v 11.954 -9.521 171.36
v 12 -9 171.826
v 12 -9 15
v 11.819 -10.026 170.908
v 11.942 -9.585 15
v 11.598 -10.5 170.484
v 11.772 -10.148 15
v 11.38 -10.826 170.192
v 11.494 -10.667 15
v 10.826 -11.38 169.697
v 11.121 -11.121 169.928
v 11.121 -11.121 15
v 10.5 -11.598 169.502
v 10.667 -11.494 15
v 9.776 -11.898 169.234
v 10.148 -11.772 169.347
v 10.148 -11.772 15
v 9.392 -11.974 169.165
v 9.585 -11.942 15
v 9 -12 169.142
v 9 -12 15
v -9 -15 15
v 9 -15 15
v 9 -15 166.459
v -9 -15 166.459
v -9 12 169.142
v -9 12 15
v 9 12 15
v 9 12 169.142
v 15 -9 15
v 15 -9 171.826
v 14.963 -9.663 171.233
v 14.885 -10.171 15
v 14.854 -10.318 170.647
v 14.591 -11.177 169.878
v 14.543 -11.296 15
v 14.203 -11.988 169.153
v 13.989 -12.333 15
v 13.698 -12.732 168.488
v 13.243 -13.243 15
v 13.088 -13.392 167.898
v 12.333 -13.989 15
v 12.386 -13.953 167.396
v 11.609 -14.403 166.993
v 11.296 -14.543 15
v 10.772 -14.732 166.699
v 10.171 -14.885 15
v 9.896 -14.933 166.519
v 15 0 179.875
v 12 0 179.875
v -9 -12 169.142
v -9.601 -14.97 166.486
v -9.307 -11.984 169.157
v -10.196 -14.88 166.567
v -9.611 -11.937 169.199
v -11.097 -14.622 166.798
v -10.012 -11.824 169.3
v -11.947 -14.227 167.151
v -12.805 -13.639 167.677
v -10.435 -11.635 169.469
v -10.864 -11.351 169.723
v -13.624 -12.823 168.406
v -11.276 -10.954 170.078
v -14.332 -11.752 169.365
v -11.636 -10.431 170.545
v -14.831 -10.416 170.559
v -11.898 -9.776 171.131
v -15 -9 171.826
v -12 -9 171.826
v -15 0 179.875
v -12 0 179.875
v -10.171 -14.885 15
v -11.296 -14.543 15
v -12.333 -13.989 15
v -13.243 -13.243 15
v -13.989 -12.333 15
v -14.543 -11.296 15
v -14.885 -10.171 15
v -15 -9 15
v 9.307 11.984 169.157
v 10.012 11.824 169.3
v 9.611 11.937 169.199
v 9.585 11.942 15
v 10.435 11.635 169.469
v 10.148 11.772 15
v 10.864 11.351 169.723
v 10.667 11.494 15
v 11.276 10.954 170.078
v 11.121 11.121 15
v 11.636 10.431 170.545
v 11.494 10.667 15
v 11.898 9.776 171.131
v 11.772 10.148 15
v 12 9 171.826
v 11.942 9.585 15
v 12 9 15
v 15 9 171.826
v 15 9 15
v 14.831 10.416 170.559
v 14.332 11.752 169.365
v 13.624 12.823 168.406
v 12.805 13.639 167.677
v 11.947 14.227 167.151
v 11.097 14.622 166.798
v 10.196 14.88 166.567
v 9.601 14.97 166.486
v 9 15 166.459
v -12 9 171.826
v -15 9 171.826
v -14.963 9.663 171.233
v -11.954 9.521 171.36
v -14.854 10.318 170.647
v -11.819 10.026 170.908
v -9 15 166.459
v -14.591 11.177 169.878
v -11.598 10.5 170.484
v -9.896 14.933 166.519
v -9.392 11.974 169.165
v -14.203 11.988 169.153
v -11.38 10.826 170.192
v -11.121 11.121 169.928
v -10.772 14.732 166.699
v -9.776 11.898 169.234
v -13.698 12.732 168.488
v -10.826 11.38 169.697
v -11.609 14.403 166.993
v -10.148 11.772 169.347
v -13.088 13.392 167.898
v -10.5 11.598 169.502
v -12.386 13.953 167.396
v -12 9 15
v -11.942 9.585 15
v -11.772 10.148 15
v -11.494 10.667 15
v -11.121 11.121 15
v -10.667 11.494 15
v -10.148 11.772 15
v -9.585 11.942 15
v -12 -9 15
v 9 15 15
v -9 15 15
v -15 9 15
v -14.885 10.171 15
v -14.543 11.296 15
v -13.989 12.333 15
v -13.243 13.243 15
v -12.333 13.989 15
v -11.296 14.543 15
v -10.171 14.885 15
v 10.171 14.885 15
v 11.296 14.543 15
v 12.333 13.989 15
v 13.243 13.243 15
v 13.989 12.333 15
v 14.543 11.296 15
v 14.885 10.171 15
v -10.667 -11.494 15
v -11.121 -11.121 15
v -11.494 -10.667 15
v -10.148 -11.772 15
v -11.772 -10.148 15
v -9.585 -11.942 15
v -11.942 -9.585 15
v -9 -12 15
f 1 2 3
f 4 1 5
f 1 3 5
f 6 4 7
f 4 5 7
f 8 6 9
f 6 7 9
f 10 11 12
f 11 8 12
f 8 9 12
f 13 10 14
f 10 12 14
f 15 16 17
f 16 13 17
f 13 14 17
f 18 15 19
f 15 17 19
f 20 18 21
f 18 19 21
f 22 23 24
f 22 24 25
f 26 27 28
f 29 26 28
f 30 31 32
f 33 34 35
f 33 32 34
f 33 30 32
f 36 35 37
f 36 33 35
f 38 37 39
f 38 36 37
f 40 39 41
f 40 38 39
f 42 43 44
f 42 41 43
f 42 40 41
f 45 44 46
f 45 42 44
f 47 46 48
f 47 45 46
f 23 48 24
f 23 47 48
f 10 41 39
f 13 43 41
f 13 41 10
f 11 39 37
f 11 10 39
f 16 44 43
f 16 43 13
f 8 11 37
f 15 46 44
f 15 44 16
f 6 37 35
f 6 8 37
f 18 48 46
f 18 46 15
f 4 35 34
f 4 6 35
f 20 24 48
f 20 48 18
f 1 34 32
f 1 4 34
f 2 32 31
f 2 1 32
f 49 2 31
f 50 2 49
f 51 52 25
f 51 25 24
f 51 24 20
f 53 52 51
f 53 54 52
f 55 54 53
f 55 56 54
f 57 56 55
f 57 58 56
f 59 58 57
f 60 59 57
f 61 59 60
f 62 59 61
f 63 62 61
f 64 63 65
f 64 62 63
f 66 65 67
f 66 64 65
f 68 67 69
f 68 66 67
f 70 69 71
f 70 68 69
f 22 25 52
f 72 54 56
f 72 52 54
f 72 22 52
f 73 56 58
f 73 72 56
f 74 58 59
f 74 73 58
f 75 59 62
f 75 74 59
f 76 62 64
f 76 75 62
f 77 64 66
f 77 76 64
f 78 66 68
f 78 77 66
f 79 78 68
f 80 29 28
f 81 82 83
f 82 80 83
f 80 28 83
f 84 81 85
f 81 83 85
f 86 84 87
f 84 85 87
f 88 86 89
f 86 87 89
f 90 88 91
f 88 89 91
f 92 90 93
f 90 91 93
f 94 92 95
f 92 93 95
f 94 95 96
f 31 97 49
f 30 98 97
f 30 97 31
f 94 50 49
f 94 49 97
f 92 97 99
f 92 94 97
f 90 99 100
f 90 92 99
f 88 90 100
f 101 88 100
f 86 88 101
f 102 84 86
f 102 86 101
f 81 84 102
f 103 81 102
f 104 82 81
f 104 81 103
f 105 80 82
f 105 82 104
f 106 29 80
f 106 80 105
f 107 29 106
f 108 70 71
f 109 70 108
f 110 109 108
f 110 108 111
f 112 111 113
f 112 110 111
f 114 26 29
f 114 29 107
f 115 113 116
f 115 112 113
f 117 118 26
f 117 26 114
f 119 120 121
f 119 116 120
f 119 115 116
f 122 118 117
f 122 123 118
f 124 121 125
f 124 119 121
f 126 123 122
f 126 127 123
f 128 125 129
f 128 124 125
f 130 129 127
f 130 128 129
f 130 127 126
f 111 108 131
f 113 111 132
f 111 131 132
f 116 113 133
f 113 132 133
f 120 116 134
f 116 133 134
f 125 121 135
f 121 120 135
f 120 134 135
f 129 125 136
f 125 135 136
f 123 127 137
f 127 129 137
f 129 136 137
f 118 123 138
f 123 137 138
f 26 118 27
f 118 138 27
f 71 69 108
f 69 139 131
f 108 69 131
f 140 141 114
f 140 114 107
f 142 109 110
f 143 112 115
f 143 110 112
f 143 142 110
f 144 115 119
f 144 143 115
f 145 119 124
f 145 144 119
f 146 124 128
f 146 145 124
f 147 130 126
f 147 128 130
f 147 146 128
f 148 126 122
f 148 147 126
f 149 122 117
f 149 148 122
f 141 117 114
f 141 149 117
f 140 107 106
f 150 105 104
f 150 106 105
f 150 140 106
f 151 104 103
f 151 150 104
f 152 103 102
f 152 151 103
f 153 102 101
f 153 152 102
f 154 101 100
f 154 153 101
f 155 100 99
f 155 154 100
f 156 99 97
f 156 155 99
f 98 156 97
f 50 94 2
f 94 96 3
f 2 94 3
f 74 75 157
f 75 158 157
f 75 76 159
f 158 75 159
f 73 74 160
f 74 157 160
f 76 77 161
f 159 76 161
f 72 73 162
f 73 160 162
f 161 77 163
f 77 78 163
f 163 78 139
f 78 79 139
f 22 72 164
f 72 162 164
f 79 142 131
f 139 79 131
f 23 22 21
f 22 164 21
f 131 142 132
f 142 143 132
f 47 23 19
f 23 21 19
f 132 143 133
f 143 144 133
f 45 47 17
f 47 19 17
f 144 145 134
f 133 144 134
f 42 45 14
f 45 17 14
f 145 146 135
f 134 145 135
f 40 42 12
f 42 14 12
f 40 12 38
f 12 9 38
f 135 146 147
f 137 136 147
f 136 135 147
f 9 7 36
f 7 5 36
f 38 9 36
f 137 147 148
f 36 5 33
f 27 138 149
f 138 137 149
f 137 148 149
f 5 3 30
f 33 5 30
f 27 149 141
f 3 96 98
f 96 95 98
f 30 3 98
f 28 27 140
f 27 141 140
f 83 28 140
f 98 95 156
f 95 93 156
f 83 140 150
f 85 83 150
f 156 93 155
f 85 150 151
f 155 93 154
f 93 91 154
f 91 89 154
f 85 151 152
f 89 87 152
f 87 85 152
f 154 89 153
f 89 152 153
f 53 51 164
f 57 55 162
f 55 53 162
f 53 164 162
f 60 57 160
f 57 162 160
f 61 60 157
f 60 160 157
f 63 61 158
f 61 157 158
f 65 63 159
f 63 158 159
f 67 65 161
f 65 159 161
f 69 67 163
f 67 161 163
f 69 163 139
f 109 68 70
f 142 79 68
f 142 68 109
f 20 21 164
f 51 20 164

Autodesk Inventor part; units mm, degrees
ref_plane "Start Plane" through (0, 0, 15) normal (0, 0, 1) x (1, 0, 0)
ref_plane "End Plane" through (0, 0, 179.8754) normal (0, 0, 1) x (1, 0, 0)
sketch "Sketch" plane through (0, 0, 0) normal (0, 0, 1) x (1, 0, 0)
  line L0 (-15, -9) -> (-15, 9)
  line L1 (-9, 15) -> (9, 15)
  line L2 (15, 9) -> (15, -9)
  line L3 (9, -15) -> (-9, -15)
  arc A0 (-15, -9) -> (-9, -15) centre (-9, -9) ccw
  arc A1 (-9, 15) -> (-15, 9) centre (-9, 9) ccw
  arc A2 (15, 9) -> (9, 15) centre (9, 9) ccw
  arc A3 (9, -15) -> (15, -9) centre (9, -9) ccw
  arc A4 (-9, 12) -> (-12, 9) centre (-9, 9) ccw
  line L4 (-9, 12) -> (9, 12)
  arc A5 (12, 9) -> (9, 12) centre (9, 9) ccw
  line L5 (12, 9) -> (12, -9)
  arc A6 (9, -12) -> (12, -9) centre (9, -9) ccw
  line L6 (9, -12) -> (-9, -12)
  arc A7 (-12, -9) -> (-9, -12) centre (-9, -9) ccw
  line L7 (-12, -9) -> (-12, 9)
  line L8 (0, 22.7397) -> (0, -22.7397) construction
  line L9 (-22.7397, 0) -> (22.7397, 0) construction
  dimension "d7" = 6
  dimension "d10" = 30
  dimension "d11" = 30
  dimension "d12" = 3
  dimension "d15" = 15
  dimension "d16" = 15
extrude "Body" add sketch "Sketch" along normal up to surface (164.8754 mm away) from surface at 15
sketch "Sketch3" plane through (0, 0, 0) normal (0, 0, 1) x (1, 0, 0)
  line L0 (0, 0) -> (10, 0)
ref_plane "Work Plane3" through (0, 0, 0) normal (0, -1, 0) x (1, 0, 0)
ref_plane "Work Plane4" through (299, -839, 15) normal (0, 0, -1) x (-1, 0, 0)
split "Split1" plane through (299, -839, 15) removes the side toward (0, 0, -1)
ref_plane "Work Plane5" through (9, 10, 188.8197) normal (0, -0.6667, 0.7454) x (1, 0, 0)
split "Split2" plane through (9, 10, 188.8197) removes the side toward (0, -0.6667, 0.7454)
ref_plane "Work Plane6" through (-9, -10, 188.8197) normal (0, 0.6667, 0.7454) x (1, 0, 0)
split "Split3" plane through (-9, -10, 188.8197) removes the side toward (0, 0.6667, 0.7454)
sketch "Sketch4" plane through (0, 0, 0) normal (0, -1, 0) x (1, 0, 0)
  line L0 (-2, 15) -> (12, 15) projected
  line L1 (-2, 179.8754) -> (12, 179.8754) projected
  dimension "d18" = 164.8754
equation "\"d7\" = G_IR"
equation "\"d10\" = G_H"
equation "\"d11\" = G_W"
equation "\"d12\" = G_T"
equation "\"d15\" = 0.5 * d10"
equation "\"d16\" = 0.5 * d11"
equation "\"d3\" = G_L"
equation "\"G_W\" = 30"
equation "\"G_H\" = 30"
equation "\"G_T\" = 3"
equation "\"G_IR\" = 6"
equation "\"G_L\" = d18"
equation "\"G_OFFSET_START\" = -15"
equation "\"G_OFFSET_END\" = -20.12461"
equation "\"d13\" = -G_OFFSET_START"
equation "\"d14\" = G_OFFSET_END + B_L"
equation "\"B_L\" = 200"
properties part number "DIN EN 10219-2 - 30 x 30 x 3  - 164.88" material "Steel, Mild"
